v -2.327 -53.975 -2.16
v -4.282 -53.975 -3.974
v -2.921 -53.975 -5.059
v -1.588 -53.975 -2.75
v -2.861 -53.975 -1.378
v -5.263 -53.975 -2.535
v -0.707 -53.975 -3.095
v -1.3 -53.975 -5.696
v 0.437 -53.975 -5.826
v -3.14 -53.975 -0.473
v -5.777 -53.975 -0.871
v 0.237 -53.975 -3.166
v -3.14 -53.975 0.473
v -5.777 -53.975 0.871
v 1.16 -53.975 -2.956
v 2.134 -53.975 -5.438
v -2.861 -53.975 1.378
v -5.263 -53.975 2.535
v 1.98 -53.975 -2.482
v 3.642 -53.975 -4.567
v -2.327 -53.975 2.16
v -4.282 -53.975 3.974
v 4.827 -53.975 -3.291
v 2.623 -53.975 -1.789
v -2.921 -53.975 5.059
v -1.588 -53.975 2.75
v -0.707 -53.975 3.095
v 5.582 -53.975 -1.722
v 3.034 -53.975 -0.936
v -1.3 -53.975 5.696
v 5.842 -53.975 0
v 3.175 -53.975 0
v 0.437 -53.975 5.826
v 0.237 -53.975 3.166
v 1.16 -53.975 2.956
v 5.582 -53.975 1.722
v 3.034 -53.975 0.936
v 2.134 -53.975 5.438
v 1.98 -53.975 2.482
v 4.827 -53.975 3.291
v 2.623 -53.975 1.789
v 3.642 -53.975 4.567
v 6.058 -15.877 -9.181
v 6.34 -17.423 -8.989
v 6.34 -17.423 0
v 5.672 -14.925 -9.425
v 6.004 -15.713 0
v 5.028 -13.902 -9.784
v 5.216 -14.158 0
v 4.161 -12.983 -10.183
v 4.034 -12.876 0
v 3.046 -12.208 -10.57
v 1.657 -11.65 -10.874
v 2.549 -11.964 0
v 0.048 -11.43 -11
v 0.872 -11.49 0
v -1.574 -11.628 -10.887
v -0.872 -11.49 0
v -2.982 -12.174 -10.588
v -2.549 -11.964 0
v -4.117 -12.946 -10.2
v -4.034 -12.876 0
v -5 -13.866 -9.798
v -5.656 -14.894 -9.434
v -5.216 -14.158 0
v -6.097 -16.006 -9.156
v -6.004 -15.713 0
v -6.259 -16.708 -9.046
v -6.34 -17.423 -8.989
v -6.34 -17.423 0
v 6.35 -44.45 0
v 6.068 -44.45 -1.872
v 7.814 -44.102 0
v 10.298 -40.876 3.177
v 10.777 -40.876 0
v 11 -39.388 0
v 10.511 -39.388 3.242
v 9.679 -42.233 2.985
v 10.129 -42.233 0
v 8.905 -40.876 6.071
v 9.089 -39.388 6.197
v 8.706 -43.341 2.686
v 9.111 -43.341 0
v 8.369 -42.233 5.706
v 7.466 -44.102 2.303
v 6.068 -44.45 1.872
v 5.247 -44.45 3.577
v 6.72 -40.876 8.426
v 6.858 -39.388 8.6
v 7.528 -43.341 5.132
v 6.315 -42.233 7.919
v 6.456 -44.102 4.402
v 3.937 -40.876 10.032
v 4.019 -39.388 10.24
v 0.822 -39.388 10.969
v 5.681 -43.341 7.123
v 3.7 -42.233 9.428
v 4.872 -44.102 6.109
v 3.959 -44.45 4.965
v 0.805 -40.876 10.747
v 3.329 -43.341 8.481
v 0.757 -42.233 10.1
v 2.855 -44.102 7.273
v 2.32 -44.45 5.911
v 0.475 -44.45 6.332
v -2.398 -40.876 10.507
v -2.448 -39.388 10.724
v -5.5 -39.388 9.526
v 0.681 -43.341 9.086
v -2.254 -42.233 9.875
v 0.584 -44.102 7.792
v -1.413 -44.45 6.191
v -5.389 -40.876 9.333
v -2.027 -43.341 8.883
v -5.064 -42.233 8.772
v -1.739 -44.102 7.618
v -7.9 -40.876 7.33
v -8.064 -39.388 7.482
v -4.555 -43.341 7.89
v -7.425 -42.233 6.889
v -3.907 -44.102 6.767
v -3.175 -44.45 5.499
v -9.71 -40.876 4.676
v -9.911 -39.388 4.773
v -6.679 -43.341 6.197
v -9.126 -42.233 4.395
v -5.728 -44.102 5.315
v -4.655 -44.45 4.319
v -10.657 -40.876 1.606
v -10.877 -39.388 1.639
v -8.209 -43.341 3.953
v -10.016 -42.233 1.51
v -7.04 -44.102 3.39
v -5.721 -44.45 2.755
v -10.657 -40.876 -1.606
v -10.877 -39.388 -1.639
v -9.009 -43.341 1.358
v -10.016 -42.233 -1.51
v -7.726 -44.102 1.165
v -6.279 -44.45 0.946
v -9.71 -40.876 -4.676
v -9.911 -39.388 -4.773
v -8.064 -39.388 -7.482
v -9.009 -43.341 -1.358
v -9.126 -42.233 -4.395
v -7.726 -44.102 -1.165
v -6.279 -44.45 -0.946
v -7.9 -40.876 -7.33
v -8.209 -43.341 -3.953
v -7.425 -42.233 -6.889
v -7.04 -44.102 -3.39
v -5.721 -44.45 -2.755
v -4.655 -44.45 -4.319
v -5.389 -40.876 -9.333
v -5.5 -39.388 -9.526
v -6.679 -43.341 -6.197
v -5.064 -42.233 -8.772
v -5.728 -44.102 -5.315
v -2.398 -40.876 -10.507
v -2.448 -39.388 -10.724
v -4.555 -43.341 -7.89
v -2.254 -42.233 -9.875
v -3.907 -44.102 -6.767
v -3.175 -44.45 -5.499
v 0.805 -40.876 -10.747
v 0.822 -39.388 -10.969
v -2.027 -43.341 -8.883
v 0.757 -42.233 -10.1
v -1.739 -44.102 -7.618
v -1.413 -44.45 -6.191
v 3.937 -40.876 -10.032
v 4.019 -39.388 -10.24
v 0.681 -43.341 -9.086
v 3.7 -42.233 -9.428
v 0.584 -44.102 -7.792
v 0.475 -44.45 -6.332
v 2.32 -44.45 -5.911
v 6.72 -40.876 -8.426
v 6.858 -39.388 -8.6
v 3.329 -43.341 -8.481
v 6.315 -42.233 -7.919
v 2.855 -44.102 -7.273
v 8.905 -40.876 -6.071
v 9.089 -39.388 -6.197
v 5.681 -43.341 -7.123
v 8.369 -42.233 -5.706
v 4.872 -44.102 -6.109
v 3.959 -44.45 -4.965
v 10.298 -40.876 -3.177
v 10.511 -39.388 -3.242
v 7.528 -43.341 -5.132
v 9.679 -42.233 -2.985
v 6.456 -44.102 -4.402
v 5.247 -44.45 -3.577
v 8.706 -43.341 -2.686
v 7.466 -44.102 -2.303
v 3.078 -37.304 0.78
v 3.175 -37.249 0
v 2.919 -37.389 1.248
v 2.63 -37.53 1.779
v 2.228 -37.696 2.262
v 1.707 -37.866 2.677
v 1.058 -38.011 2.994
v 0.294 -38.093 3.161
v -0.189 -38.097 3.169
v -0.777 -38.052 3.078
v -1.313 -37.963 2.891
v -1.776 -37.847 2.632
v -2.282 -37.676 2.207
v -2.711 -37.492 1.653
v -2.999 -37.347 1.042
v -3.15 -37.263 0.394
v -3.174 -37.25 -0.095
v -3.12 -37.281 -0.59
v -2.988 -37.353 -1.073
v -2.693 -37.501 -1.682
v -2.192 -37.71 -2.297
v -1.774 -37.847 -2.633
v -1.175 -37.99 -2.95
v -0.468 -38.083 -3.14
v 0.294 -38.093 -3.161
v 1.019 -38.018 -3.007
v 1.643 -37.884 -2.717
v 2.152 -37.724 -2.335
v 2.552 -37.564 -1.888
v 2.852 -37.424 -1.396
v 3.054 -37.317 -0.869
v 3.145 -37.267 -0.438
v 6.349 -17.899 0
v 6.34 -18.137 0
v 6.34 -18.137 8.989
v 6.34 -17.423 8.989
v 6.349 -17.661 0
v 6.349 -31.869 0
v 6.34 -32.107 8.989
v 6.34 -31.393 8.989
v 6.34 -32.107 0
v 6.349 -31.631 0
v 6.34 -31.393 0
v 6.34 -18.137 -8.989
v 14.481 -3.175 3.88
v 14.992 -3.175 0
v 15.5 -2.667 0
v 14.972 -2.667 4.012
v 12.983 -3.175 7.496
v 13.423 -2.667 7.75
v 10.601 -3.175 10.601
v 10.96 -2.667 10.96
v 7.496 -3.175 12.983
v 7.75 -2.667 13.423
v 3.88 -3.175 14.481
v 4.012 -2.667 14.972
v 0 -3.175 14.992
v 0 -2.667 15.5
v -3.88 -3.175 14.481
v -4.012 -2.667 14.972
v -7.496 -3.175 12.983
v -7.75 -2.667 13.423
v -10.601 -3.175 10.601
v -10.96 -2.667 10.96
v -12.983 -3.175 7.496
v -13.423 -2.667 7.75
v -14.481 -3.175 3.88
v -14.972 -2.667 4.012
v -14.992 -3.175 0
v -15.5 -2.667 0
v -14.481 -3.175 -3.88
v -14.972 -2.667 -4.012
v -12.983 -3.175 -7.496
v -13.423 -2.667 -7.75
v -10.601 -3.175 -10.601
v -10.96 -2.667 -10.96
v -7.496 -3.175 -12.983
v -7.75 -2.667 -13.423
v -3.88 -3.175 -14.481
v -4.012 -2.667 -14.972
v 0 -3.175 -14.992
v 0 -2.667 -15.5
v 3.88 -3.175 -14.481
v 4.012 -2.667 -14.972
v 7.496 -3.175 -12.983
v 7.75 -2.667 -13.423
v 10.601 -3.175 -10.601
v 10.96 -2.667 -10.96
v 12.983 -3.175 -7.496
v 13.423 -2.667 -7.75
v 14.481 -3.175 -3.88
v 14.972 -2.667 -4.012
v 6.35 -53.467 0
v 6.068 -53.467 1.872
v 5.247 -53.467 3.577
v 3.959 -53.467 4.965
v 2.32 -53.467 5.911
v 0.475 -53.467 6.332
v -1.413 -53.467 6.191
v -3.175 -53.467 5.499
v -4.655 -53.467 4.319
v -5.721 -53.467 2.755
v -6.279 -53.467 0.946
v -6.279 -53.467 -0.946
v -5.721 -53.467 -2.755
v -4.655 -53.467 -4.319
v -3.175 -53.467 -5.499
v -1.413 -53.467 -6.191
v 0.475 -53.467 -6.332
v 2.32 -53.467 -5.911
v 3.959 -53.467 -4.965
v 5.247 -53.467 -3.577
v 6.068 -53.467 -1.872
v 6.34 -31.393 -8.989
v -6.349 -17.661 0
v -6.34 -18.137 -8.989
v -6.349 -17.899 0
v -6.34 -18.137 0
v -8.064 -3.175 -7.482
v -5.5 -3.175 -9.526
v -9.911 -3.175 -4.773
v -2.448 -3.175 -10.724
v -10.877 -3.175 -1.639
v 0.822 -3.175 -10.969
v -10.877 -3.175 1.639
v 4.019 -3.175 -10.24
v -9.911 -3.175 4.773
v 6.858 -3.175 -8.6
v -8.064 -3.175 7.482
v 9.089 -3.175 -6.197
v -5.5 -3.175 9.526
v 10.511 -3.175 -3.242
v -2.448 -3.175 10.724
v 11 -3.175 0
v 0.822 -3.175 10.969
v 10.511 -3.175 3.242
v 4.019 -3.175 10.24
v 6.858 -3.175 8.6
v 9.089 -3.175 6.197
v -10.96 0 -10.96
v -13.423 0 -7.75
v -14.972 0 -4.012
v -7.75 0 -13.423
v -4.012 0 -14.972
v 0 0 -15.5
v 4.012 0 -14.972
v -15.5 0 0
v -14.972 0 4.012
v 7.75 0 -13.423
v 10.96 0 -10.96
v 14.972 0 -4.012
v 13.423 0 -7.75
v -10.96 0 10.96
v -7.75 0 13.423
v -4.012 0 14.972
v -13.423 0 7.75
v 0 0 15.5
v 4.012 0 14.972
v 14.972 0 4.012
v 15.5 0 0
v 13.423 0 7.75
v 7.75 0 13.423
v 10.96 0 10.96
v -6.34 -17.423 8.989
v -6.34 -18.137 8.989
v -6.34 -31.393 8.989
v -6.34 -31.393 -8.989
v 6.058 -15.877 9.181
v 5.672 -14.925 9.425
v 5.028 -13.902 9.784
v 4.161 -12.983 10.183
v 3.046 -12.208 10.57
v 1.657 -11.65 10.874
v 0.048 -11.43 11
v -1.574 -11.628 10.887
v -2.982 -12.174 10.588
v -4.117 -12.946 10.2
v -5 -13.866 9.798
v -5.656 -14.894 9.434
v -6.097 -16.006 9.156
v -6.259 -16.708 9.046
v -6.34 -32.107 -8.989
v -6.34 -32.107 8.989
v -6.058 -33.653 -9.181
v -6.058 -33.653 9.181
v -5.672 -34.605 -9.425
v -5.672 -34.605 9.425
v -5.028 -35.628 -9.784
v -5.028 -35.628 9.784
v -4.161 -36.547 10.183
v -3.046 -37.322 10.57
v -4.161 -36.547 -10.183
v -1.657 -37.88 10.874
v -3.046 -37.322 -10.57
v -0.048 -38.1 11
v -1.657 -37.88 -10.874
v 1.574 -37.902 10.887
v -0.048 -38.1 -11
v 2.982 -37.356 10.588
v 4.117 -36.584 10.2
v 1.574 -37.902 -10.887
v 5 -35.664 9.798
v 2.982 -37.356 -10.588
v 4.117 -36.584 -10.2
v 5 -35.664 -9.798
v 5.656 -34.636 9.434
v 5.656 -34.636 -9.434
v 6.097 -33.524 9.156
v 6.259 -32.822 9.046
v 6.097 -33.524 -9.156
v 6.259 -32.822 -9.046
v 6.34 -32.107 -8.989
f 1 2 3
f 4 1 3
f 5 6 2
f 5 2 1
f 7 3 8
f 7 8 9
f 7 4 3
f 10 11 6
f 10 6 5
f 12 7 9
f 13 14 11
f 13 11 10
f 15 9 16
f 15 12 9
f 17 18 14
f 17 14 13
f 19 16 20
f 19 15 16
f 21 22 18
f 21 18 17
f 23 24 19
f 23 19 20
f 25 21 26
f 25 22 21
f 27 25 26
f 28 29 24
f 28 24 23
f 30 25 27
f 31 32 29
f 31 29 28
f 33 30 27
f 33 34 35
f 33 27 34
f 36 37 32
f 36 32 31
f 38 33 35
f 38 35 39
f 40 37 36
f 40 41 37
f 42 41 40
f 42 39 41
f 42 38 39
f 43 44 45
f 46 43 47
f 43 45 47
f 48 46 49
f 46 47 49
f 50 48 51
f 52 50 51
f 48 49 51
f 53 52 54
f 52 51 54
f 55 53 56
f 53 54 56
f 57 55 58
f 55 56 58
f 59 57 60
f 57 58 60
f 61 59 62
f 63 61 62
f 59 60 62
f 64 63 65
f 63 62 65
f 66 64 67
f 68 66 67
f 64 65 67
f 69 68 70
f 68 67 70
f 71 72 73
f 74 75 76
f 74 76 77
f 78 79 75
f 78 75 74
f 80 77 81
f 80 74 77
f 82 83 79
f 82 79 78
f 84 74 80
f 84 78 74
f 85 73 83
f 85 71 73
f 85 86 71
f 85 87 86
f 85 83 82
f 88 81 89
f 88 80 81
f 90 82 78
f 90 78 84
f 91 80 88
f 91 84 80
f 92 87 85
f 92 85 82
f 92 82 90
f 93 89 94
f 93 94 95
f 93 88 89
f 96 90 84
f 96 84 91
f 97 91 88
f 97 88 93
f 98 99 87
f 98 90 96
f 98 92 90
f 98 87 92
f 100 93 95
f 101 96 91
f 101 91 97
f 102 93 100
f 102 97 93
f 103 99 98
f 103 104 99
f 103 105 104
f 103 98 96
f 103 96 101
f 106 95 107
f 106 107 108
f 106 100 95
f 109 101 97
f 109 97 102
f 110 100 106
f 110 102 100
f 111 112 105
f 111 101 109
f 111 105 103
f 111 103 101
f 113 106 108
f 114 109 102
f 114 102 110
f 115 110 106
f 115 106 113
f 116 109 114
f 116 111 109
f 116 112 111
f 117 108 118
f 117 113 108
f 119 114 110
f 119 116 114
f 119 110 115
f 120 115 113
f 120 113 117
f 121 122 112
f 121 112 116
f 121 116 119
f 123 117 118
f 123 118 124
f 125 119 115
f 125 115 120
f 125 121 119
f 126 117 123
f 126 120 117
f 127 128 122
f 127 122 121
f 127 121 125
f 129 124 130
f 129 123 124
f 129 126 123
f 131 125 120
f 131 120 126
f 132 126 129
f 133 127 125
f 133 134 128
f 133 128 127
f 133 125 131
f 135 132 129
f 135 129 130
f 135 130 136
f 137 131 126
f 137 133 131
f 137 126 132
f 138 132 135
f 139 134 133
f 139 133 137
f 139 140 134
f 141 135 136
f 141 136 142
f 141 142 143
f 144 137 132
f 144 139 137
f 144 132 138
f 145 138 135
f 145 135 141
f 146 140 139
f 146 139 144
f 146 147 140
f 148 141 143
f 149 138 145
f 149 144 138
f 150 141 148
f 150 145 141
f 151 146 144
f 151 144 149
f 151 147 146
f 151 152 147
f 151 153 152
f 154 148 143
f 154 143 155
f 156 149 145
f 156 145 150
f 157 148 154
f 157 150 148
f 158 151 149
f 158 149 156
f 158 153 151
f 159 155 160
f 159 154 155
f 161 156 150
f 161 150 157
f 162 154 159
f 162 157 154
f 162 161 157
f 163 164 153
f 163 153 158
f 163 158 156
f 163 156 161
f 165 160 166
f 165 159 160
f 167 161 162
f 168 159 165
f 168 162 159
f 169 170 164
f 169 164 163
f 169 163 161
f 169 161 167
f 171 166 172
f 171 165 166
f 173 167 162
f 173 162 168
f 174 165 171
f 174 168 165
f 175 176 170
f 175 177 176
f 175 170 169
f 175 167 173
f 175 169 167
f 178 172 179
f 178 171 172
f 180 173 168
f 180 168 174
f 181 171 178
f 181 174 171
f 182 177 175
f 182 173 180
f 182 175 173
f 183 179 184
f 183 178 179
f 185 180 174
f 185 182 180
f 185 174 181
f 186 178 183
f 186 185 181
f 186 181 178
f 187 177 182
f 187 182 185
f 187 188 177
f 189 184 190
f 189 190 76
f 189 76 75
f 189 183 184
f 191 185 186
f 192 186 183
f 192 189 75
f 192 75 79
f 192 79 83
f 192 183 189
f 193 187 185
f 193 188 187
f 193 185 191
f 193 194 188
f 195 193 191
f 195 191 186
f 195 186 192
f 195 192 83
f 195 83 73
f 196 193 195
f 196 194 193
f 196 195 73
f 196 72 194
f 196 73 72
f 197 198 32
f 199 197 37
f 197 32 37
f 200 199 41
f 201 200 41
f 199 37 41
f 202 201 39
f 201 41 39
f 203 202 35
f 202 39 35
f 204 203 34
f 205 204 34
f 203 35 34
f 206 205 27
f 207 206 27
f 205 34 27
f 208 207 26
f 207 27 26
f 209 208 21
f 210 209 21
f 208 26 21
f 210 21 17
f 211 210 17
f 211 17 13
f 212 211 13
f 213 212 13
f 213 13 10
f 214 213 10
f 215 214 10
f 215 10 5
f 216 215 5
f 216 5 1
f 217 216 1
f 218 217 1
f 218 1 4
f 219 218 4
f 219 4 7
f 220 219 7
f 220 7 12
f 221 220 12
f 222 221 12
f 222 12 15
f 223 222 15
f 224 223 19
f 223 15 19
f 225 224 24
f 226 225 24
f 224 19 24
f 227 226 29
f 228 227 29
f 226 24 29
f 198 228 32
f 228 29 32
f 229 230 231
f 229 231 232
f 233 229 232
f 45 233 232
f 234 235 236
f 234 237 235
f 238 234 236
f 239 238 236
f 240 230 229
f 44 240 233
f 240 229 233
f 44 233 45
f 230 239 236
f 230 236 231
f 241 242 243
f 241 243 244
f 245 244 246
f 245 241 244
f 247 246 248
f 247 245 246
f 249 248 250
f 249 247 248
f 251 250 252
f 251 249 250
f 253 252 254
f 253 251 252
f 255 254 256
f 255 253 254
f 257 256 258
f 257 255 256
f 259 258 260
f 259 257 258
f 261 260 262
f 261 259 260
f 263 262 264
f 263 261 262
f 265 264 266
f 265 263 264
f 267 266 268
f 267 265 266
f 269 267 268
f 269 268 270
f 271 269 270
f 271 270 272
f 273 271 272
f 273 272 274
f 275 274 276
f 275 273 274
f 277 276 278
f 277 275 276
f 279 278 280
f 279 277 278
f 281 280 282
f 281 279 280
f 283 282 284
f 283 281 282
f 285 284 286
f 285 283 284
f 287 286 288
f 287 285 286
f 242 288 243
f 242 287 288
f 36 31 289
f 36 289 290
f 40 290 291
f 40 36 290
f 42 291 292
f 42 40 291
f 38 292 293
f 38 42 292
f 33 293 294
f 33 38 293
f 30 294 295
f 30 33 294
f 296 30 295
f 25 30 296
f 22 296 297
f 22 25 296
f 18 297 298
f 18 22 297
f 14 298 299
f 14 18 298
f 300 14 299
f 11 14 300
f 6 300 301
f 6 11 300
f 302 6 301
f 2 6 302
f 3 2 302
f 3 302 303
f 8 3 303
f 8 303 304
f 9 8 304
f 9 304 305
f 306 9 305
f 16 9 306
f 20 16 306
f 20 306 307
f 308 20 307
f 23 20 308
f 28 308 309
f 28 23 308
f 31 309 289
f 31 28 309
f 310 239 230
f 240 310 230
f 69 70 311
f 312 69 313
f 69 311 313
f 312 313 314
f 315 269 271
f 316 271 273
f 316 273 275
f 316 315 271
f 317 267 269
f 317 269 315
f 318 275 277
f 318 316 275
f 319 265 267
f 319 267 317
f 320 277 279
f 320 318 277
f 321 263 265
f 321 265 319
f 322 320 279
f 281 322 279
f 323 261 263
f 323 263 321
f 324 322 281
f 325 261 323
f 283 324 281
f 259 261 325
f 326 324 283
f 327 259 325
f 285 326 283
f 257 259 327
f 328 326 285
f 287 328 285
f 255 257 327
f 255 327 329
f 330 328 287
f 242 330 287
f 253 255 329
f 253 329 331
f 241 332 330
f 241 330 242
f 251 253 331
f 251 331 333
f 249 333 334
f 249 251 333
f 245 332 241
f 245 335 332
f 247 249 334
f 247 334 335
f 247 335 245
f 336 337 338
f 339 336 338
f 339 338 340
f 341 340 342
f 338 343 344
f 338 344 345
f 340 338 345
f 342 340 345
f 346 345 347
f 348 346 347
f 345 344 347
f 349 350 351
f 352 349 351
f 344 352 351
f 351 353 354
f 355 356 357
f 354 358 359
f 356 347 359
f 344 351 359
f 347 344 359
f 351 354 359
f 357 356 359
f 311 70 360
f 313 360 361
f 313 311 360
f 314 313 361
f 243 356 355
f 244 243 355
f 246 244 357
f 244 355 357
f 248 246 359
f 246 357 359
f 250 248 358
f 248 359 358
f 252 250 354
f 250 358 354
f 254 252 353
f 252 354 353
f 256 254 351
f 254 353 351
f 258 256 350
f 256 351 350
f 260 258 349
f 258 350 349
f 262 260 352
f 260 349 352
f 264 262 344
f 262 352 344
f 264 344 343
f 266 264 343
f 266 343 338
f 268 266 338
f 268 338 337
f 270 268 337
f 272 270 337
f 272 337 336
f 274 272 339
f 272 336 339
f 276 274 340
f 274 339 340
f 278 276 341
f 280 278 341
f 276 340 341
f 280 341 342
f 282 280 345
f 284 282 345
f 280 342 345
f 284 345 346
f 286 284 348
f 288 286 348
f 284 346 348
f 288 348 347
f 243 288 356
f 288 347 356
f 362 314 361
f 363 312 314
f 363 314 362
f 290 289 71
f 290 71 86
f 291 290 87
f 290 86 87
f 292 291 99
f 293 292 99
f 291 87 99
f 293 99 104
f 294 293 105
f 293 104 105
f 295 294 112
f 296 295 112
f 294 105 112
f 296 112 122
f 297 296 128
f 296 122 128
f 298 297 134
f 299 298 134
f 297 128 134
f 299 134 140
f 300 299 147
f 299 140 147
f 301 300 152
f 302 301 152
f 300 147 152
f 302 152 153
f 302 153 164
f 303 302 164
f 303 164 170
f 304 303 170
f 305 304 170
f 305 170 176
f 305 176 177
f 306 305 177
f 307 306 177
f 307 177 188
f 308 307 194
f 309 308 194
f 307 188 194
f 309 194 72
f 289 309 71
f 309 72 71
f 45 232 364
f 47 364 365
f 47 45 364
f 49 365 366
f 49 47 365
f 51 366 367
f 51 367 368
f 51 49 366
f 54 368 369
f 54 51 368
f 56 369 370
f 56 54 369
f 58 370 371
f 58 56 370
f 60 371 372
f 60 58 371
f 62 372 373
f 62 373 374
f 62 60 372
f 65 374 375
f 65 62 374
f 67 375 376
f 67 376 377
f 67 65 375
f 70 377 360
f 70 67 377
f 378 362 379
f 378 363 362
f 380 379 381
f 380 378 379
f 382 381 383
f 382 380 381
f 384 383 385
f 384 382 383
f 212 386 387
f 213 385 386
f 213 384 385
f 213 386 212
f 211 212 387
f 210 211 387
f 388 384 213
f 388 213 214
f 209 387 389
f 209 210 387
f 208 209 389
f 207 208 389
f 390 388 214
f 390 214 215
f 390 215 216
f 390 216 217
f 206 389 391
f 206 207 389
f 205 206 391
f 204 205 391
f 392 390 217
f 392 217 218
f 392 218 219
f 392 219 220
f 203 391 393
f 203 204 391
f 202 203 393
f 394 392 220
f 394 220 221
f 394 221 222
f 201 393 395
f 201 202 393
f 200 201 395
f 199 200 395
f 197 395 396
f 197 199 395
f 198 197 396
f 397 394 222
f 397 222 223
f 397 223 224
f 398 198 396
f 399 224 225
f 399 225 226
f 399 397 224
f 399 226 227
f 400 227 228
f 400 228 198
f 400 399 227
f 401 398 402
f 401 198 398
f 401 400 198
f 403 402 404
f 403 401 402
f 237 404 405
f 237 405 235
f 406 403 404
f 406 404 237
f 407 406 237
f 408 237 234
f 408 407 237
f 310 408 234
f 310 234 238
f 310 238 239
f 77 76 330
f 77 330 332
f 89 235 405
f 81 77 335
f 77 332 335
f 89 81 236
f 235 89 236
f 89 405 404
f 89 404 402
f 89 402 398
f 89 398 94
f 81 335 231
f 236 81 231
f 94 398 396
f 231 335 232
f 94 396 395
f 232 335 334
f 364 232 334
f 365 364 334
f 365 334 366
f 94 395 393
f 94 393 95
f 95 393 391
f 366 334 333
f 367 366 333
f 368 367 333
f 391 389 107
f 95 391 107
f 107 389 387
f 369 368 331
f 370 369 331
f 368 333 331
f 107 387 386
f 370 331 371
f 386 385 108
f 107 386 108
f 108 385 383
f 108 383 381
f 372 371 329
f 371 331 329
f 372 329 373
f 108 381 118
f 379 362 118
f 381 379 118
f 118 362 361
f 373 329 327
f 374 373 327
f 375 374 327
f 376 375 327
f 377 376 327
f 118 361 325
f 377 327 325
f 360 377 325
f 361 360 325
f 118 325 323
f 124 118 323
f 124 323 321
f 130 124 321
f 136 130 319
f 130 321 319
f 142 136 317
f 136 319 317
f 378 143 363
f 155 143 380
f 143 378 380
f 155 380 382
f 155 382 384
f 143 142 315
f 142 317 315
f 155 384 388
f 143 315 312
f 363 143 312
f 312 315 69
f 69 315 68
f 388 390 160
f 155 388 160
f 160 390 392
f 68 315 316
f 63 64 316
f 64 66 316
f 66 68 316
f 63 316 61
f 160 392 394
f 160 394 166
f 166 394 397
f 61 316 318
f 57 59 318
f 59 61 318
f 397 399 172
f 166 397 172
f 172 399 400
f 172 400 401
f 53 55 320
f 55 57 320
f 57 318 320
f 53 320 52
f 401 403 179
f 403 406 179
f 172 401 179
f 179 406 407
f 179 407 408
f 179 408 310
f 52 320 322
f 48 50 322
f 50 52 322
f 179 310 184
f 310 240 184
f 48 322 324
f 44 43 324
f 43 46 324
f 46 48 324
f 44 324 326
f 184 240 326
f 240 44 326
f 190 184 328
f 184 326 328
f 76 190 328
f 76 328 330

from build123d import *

# Parameters (mm, degrees)
F0_R          = 11
F1_DEPTH      = 44.45
F0_R_2        = 15.5
F2_DEPTH      = 3.175
F3_R          = 6.35
F4_DEPTH      = 9.525
F7_DEPTH      = 25.4
F7_DEPTH_BACK = 25.4
F8_R          = 3.175
F9_DEPTH      = 25.4
F10_SIZE      = 0.508


# Not quite as in the source:
# - a fillet or chamfer that OpenCascade refuses, or shapes differently, is made with other operations: its cross-section is extruded or revolved along the edge and cut away or added


with BuildPart() as f1:
    # F0 (on Front) → F1 (new body)
    with BuildSketch(Plane.XZ):
        Circle(F0_R)
    extrude(amount=F1_DEPTH)

    # F0 (on Front) → F2 (join)
    with BuildSketch(Plane.XZ):
        Circle(F0_R_2)
        Circle(F0_R, mode=Mode.SUBTRACT)
    extrude(amount=F2_DEPTH)

    # F3 (on face) → F4 (join)
    with BuildSketch(Plane.XZ.offset(44.45)):
        Circle(F3_R)
    extrude(amount=F4_DEPTH)

    # F5: fillet of radius 5.08 on 1 edges, made by hand

    # F5_s1 → F5_t2 (revolve, cut)
    with BuildSketch(Plane.XY):
        with BuildLine():
            ThreePointArc((11, -39.3882315343), (9.6610426354, -42.8249450807), (6.35, -44.45))
            Line((6.35, -44.45), (11, -44.45))
            Line((11, -44.45), (11, -39.3882315343))
        make_face()
    revolve(axis=Axis((0, -44.45, 0), (0, -1, 0)), mode=Mode.SUBTRACT)

    # F6 (on Top) → F7 (cut, two sides)
    with BuildSketch(Plane.XY) as f7_sk:
        with BuildLine():
            Line((-6.3399745388, -32.1066831191), (-6.3399745388, -31.3933168809))
            ThreePointArc((-6.3399745388, -31.3933168809), (-6.35, -31.75), (-6.3399745388, -32.1066831191))
        make_face()
        with BuildLine():
            Line((-6.3399745388, -18.1366831191), (-6.3399745388, -31.3933168809))
            Line((-6.3399745388, -31.3933168809), (-6.3399745388, -32.1066831191))
            ThreePointArc((-6.3399745388, -32.1066831191), (0, -38.1), (6.3399745388, -32.1066831191))
            Line((6.3399745388, -32.1066831191), (6.3399745388, -31.3933168809))
            Line((6.3399745388, -31.3933168809), (6.3399745388, -18.1366831191))
            Line((6.3399745388, -18.1366831191), (6.3399745388, -17.4233168809))
            ThreePointArc((6.3399745388, -17.4233168809), (0, -11.43), (-6.3399745388, -17.4233168809))
            Line((-6.3399745388, -17.4233168809), (-6.3399745388, -18.1366831191))
        make_face()
        with BuildLine():
            ThreePointArc((-6.3399745388, -17.4233168809), (-6.35, -17.78), (-6.3399745388, -18.1366831191))
            Line((-6.3399745388, -18.1366831191), (-6.3399745388, -17.4233168809))
        make_face()
        with BuildLine():
            Line((6.3399745388, -31.3933168809), (6.3399745388, -32.1066831191))
            ThreePointArc((6.3399745388, -32.1066831191), (6.35, -31.75), (6.3399745388, -31.3933168809))
        make_face()
        with BuildLine():
            ThreePointArc((6.3399745388, -18.1366831191), (6.35, -17.78), (6.3399745388, -17.4233168809))
            Line((6.3399745388, -17.4233168809), (6.3399745388, -18.1366831191))
        make_face()
    extrude(amount=-F7_DEPTH, mode=Mode.SUBTRACT)
    extrude(f7_sk.sketch, amount=F7_DEPTH_BACK, mode=Mode.SUBTRACT)

    # F8 (on face) → F9 (cut)
    with BuildSketch(Plane.XZ.offset(53.975)):
        Circle(F8_R)
    extrude(amount=-F9_DEPTH, mode=Mode.SUBTRACT)

    # F10
    f10_edges = [f1.edges().sort_by_distance(p)[0] for p in [
        (-15.5, -3.175, 0),
        (-6.35, -53.975, 0),
    ]]
    chamfer(f10_edges, length=F10_SIZE)


solid = f1.part
